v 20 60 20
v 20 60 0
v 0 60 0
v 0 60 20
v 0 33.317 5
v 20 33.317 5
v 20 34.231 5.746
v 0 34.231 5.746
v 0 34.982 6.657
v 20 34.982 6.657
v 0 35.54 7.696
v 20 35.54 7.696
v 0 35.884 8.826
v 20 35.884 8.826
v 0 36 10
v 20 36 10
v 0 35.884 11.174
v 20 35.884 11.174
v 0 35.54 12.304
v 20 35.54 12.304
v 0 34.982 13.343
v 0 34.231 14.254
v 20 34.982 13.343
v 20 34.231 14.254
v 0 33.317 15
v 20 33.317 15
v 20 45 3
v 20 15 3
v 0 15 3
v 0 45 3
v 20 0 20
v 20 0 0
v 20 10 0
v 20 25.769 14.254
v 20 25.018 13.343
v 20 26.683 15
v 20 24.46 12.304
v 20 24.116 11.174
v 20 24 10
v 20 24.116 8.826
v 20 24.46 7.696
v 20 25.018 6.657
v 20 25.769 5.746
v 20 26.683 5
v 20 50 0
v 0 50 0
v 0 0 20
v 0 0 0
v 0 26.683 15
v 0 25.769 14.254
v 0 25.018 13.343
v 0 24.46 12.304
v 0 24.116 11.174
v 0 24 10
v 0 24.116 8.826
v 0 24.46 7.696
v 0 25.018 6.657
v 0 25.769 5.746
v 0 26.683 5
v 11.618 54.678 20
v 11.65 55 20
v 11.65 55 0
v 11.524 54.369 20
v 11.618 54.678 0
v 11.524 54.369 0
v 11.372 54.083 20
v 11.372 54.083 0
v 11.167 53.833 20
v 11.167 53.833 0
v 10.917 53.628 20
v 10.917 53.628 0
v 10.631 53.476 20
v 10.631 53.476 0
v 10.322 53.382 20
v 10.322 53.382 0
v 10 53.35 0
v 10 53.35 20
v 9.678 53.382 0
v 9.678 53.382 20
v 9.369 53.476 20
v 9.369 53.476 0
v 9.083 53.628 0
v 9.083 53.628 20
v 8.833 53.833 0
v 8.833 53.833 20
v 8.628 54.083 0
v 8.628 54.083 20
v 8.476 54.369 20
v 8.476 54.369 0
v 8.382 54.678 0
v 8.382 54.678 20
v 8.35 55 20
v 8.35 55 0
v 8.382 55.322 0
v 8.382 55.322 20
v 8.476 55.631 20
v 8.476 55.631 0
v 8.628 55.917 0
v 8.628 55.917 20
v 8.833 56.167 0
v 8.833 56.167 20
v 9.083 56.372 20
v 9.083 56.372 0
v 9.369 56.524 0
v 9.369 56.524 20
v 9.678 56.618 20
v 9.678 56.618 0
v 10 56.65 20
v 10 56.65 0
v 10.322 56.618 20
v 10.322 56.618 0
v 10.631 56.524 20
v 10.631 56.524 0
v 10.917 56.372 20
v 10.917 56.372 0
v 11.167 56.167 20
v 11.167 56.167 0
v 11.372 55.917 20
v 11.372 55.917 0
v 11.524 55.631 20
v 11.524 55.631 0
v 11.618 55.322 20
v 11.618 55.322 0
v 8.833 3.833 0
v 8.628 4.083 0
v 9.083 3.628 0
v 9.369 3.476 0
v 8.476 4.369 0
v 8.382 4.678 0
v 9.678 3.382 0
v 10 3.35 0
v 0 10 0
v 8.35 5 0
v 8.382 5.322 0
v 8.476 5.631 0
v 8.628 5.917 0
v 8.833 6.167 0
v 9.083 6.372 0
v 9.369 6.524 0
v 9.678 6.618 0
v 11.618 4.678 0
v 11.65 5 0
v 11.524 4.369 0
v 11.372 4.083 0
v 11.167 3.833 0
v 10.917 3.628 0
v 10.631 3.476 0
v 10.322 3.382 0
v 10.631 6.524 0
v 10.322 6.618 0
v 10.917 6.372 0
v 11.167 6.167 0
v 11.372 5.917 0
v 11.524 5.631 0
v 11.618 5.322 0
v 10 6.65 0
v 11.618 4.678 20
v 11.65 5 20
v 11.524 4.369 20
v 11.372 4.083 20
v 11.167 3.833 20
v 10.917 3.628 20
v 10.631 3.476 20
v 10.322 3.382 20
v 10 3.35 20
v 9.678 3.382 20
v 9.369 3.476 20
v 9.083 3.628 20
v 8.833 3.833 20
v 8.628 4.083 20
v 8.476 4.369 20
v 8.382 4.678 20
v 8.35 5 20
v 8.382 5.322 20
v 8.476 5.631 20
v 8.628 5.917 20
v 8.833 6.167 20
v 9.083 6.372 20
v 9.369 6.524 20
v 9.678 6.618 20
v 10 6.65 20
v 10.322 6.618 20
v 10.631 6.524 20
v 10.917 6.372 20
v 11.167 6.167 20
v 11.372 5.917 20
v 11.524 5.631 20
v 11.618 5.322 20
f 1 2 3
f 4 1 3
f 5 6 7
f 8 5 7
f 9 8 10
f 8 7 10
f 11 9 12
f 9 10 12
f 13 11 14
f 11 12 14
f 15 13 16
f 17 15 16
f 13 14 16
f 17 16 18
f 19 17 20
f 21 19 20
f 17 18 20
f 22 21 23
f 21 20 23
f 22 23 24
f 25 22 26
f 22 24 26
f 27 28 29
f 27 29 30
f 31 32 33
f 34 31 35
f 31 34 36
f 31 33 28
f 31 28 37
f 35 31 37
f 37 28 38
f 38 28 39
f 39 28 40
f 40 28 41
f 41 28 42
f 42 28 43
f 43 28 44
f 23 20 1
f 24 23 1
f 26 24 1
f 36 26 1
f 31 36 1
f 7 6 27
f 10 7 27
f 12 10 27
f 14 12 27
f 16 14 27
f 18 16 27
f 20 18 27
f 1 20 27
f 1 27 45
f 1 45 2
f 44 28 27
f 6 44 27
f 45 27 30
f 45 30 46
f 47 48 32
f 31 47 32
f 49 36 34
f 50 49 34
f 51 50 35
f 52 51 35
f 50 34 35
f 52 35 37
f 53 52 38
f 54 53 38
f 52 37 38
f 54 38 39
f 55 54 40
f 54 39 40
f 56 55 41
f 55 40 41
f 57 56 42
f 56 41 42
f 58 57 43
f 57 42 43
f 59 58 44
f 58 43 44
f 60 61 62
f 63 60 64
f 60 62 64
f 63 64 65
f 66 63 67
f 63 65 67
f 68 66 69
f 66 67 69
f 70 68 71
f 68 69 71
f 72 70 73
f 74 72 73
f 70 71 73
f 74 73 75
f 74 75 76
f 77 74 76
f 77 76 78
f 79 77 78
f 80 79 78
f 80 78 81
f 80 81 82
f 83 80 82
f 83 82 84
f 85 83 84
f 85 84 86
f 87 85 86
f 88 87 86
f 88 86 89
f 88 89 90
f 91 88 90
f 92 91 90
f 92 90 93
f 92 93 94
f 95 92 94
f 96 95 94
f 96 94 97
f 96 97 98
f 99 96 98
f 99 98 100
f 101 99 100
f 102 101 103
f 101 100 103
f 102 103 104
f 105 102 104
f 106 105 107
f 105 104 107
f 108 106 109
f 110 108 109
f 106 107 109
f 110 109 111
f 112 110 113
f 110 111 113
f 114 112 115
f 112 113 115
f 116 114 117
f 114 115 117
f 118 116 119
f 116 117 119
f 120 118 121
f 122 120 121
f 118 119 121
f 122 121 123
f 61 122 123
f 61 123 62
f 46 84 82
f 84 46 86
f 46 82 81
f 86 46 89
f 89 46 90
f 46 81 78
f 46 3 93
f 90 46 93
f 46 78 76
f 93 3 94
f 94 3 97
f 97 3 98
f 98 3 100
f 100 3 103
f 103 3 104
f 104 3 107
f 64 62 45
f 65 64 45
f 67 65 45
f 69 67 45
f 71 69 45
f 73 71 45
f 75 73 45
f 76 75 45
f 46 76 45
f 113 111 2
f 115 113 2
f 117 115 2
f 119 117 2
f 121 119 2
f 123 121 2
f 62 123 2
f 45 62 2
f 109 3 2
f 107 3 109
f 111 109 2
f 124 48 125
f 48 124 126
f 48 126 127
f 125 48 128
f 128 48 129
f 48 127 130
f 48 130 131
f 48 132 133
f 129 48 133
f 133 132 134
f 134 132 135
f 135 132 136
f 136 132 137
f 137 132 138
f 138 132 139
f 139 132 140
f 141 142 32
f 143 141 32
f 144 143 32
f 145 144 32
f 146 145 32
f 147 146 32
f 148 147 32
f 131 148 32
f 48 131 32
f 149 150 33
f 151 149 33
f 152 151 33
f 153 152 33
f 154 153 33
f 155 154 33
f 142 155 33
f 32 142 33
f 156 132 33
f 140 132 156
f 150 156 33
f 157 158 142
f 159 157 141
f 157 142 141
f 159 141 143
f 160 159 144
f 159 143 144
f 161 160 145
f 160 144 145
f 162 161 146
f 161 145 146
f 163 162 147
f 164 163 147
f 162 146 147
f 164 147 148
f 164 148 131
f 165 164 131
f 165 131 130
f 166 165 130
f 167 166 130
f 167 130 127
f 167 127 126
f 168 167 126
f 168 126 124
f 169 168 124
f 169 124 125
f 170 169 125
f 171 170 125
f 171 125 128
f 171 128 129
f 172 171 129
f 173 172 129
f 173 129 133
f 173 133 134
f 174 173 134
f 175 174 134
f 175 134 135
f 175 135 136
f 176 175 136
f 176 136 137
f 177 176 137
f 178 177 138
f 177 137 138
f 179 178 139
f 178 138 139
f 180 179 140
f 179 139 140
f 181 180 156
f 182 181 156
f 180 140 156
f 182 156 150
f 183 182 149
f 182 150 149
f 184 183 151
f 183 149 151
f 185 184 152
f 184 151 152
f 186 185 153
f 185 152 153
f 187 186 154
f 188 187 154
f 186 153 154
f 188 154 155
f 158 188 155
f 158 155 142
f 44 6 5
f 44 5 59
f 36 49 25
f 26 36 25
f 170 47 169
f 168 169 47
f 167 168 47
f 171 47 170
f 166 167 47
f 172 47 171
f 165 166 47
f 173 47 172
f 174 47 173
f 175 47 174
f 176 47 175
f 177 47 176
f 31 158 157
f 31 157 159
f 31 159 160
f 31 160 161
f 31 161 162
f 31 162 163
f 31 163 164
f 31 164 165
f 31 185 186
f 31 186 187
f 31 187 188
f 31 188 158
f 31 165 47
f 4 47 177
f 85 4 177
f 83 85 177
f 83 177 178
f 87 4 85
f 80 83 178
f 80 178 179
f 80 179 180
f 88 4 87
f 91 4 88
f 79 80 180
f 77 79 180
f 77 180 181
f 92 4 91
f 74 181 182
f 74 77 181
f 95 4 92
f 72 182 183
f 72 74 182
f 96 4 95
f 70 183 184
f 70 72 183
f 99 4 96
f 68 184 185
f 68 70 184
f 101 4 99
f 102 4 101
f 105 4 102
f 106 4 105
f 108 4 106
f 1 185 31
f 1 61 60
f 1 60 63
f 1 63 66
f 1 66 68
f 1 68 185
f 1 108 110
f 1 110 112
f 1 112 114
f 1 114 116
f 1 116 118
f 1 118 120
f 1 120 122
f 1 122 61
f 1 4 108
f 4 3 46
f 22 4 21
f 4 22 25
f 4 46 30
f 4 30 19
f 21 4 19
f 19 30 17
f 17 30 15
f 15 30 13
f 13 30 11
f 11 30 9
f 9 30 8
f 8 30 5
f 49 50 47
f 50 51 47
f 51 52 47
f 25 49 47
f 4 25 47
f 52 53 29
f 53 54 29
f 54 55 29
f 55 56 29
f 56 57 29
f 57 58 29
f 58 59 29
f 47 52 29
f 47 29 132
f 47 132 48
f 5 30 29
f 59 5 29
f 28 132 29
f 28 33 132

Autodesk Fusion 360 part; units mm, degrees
sketch "Sketch1" plane through (0, 0, 0) normal (0, 0, 1) x (1, 0, 0)
  line L0 (0, 0) -> (20, 0)
  line L1 (20, 0) -> (20, 60)
  line L2 (20, 60) -> (0, 60)
  line L3 (0, 60) -> (0, 0)
extrude "Extrude1" add sketch "Sketch1" along normal blind 30
extrude "Extrude2" cut 1 faces at (6.6667, 40, 30) along direction (0, 0, -1) blind 10
sketch "Sketch2" plane through (20, 0, 0) normal (1, 0, 0) x (0, 1, 0)
  line L0 (60, 20) -> (0, 20)
  line L1 (0, 20) -> (0, 0)
  line L2 (0, 0) -> (60, 0)
  line L3 (60, 0) -> (60, 20)
  line L4 (36, 5) -> (24, 5)
  line L5 (24, 5) -> (24, 15)
  line L6 (24, 15) -> (36, 15)
  line L7 (36, 15) -> (36, 5)
  line L8 (36, 5) -> (24, 15) construction
  line L9 (24, 5) -> (36, 15) construction
  circle A0 centre (30, 10) radius 6
  point P0 (30, 10)
extrude "Extrude3" cut sketch "Sketch2" against normal blind 29 contours L4 L6 A0
sketch "Sketch3" plane through (0, 0, 0) normal (0, 0, -1) x (1, 0, 0)
  line L0 (0, 0) -> (0, -60)
  line L1 (0, -60) -> (20, -60)
  line L2 (20, -60) -> (20, 0)
  line L3 (20, 0) -> (0, 0)
  circle A0 centre (10, -5) radius 1.65
  circle A1 centre (10, -55) radius 1.65
  dimension "d7" = 3.3
  dimension "d8" = 3.3
extrude "Extrude4" cut sketch "Sketch3" against normal blind 45 contours A0 | A1
sketch "Sketch4" plane through (20, 0, 0) normal (1, 0, 0) x (0, 1, 0)
  line L0 (33.3166, 5) -> (26.6834, 5)
  arc A0 (26.6834, 15) -> (26.6834, 5) centre (30, 10) ccw
  line L1 (26.6834, 15) -> (33.3166, 15)
  arc A1 (33.3166, 5) -> (33.3166, 15) centre (30, 10) ccw
  line L2 (60, 20) -> (0, 20)
  line L3 (0, 20) -> (0, 0)
  line L4 (0, 0) -> (60, 0)
  line L5 (60, 0) -> (60, 20)
  line L6 (10, 0) -> (15, 3)
  line L7 (15, 3) -> (45, 3)
  line L8 (45, 3) -> (50, 0)
extrude "Extrude5" cut sketch "Sketch4" against normal blind 43 contours L4 L6 L7 L8
